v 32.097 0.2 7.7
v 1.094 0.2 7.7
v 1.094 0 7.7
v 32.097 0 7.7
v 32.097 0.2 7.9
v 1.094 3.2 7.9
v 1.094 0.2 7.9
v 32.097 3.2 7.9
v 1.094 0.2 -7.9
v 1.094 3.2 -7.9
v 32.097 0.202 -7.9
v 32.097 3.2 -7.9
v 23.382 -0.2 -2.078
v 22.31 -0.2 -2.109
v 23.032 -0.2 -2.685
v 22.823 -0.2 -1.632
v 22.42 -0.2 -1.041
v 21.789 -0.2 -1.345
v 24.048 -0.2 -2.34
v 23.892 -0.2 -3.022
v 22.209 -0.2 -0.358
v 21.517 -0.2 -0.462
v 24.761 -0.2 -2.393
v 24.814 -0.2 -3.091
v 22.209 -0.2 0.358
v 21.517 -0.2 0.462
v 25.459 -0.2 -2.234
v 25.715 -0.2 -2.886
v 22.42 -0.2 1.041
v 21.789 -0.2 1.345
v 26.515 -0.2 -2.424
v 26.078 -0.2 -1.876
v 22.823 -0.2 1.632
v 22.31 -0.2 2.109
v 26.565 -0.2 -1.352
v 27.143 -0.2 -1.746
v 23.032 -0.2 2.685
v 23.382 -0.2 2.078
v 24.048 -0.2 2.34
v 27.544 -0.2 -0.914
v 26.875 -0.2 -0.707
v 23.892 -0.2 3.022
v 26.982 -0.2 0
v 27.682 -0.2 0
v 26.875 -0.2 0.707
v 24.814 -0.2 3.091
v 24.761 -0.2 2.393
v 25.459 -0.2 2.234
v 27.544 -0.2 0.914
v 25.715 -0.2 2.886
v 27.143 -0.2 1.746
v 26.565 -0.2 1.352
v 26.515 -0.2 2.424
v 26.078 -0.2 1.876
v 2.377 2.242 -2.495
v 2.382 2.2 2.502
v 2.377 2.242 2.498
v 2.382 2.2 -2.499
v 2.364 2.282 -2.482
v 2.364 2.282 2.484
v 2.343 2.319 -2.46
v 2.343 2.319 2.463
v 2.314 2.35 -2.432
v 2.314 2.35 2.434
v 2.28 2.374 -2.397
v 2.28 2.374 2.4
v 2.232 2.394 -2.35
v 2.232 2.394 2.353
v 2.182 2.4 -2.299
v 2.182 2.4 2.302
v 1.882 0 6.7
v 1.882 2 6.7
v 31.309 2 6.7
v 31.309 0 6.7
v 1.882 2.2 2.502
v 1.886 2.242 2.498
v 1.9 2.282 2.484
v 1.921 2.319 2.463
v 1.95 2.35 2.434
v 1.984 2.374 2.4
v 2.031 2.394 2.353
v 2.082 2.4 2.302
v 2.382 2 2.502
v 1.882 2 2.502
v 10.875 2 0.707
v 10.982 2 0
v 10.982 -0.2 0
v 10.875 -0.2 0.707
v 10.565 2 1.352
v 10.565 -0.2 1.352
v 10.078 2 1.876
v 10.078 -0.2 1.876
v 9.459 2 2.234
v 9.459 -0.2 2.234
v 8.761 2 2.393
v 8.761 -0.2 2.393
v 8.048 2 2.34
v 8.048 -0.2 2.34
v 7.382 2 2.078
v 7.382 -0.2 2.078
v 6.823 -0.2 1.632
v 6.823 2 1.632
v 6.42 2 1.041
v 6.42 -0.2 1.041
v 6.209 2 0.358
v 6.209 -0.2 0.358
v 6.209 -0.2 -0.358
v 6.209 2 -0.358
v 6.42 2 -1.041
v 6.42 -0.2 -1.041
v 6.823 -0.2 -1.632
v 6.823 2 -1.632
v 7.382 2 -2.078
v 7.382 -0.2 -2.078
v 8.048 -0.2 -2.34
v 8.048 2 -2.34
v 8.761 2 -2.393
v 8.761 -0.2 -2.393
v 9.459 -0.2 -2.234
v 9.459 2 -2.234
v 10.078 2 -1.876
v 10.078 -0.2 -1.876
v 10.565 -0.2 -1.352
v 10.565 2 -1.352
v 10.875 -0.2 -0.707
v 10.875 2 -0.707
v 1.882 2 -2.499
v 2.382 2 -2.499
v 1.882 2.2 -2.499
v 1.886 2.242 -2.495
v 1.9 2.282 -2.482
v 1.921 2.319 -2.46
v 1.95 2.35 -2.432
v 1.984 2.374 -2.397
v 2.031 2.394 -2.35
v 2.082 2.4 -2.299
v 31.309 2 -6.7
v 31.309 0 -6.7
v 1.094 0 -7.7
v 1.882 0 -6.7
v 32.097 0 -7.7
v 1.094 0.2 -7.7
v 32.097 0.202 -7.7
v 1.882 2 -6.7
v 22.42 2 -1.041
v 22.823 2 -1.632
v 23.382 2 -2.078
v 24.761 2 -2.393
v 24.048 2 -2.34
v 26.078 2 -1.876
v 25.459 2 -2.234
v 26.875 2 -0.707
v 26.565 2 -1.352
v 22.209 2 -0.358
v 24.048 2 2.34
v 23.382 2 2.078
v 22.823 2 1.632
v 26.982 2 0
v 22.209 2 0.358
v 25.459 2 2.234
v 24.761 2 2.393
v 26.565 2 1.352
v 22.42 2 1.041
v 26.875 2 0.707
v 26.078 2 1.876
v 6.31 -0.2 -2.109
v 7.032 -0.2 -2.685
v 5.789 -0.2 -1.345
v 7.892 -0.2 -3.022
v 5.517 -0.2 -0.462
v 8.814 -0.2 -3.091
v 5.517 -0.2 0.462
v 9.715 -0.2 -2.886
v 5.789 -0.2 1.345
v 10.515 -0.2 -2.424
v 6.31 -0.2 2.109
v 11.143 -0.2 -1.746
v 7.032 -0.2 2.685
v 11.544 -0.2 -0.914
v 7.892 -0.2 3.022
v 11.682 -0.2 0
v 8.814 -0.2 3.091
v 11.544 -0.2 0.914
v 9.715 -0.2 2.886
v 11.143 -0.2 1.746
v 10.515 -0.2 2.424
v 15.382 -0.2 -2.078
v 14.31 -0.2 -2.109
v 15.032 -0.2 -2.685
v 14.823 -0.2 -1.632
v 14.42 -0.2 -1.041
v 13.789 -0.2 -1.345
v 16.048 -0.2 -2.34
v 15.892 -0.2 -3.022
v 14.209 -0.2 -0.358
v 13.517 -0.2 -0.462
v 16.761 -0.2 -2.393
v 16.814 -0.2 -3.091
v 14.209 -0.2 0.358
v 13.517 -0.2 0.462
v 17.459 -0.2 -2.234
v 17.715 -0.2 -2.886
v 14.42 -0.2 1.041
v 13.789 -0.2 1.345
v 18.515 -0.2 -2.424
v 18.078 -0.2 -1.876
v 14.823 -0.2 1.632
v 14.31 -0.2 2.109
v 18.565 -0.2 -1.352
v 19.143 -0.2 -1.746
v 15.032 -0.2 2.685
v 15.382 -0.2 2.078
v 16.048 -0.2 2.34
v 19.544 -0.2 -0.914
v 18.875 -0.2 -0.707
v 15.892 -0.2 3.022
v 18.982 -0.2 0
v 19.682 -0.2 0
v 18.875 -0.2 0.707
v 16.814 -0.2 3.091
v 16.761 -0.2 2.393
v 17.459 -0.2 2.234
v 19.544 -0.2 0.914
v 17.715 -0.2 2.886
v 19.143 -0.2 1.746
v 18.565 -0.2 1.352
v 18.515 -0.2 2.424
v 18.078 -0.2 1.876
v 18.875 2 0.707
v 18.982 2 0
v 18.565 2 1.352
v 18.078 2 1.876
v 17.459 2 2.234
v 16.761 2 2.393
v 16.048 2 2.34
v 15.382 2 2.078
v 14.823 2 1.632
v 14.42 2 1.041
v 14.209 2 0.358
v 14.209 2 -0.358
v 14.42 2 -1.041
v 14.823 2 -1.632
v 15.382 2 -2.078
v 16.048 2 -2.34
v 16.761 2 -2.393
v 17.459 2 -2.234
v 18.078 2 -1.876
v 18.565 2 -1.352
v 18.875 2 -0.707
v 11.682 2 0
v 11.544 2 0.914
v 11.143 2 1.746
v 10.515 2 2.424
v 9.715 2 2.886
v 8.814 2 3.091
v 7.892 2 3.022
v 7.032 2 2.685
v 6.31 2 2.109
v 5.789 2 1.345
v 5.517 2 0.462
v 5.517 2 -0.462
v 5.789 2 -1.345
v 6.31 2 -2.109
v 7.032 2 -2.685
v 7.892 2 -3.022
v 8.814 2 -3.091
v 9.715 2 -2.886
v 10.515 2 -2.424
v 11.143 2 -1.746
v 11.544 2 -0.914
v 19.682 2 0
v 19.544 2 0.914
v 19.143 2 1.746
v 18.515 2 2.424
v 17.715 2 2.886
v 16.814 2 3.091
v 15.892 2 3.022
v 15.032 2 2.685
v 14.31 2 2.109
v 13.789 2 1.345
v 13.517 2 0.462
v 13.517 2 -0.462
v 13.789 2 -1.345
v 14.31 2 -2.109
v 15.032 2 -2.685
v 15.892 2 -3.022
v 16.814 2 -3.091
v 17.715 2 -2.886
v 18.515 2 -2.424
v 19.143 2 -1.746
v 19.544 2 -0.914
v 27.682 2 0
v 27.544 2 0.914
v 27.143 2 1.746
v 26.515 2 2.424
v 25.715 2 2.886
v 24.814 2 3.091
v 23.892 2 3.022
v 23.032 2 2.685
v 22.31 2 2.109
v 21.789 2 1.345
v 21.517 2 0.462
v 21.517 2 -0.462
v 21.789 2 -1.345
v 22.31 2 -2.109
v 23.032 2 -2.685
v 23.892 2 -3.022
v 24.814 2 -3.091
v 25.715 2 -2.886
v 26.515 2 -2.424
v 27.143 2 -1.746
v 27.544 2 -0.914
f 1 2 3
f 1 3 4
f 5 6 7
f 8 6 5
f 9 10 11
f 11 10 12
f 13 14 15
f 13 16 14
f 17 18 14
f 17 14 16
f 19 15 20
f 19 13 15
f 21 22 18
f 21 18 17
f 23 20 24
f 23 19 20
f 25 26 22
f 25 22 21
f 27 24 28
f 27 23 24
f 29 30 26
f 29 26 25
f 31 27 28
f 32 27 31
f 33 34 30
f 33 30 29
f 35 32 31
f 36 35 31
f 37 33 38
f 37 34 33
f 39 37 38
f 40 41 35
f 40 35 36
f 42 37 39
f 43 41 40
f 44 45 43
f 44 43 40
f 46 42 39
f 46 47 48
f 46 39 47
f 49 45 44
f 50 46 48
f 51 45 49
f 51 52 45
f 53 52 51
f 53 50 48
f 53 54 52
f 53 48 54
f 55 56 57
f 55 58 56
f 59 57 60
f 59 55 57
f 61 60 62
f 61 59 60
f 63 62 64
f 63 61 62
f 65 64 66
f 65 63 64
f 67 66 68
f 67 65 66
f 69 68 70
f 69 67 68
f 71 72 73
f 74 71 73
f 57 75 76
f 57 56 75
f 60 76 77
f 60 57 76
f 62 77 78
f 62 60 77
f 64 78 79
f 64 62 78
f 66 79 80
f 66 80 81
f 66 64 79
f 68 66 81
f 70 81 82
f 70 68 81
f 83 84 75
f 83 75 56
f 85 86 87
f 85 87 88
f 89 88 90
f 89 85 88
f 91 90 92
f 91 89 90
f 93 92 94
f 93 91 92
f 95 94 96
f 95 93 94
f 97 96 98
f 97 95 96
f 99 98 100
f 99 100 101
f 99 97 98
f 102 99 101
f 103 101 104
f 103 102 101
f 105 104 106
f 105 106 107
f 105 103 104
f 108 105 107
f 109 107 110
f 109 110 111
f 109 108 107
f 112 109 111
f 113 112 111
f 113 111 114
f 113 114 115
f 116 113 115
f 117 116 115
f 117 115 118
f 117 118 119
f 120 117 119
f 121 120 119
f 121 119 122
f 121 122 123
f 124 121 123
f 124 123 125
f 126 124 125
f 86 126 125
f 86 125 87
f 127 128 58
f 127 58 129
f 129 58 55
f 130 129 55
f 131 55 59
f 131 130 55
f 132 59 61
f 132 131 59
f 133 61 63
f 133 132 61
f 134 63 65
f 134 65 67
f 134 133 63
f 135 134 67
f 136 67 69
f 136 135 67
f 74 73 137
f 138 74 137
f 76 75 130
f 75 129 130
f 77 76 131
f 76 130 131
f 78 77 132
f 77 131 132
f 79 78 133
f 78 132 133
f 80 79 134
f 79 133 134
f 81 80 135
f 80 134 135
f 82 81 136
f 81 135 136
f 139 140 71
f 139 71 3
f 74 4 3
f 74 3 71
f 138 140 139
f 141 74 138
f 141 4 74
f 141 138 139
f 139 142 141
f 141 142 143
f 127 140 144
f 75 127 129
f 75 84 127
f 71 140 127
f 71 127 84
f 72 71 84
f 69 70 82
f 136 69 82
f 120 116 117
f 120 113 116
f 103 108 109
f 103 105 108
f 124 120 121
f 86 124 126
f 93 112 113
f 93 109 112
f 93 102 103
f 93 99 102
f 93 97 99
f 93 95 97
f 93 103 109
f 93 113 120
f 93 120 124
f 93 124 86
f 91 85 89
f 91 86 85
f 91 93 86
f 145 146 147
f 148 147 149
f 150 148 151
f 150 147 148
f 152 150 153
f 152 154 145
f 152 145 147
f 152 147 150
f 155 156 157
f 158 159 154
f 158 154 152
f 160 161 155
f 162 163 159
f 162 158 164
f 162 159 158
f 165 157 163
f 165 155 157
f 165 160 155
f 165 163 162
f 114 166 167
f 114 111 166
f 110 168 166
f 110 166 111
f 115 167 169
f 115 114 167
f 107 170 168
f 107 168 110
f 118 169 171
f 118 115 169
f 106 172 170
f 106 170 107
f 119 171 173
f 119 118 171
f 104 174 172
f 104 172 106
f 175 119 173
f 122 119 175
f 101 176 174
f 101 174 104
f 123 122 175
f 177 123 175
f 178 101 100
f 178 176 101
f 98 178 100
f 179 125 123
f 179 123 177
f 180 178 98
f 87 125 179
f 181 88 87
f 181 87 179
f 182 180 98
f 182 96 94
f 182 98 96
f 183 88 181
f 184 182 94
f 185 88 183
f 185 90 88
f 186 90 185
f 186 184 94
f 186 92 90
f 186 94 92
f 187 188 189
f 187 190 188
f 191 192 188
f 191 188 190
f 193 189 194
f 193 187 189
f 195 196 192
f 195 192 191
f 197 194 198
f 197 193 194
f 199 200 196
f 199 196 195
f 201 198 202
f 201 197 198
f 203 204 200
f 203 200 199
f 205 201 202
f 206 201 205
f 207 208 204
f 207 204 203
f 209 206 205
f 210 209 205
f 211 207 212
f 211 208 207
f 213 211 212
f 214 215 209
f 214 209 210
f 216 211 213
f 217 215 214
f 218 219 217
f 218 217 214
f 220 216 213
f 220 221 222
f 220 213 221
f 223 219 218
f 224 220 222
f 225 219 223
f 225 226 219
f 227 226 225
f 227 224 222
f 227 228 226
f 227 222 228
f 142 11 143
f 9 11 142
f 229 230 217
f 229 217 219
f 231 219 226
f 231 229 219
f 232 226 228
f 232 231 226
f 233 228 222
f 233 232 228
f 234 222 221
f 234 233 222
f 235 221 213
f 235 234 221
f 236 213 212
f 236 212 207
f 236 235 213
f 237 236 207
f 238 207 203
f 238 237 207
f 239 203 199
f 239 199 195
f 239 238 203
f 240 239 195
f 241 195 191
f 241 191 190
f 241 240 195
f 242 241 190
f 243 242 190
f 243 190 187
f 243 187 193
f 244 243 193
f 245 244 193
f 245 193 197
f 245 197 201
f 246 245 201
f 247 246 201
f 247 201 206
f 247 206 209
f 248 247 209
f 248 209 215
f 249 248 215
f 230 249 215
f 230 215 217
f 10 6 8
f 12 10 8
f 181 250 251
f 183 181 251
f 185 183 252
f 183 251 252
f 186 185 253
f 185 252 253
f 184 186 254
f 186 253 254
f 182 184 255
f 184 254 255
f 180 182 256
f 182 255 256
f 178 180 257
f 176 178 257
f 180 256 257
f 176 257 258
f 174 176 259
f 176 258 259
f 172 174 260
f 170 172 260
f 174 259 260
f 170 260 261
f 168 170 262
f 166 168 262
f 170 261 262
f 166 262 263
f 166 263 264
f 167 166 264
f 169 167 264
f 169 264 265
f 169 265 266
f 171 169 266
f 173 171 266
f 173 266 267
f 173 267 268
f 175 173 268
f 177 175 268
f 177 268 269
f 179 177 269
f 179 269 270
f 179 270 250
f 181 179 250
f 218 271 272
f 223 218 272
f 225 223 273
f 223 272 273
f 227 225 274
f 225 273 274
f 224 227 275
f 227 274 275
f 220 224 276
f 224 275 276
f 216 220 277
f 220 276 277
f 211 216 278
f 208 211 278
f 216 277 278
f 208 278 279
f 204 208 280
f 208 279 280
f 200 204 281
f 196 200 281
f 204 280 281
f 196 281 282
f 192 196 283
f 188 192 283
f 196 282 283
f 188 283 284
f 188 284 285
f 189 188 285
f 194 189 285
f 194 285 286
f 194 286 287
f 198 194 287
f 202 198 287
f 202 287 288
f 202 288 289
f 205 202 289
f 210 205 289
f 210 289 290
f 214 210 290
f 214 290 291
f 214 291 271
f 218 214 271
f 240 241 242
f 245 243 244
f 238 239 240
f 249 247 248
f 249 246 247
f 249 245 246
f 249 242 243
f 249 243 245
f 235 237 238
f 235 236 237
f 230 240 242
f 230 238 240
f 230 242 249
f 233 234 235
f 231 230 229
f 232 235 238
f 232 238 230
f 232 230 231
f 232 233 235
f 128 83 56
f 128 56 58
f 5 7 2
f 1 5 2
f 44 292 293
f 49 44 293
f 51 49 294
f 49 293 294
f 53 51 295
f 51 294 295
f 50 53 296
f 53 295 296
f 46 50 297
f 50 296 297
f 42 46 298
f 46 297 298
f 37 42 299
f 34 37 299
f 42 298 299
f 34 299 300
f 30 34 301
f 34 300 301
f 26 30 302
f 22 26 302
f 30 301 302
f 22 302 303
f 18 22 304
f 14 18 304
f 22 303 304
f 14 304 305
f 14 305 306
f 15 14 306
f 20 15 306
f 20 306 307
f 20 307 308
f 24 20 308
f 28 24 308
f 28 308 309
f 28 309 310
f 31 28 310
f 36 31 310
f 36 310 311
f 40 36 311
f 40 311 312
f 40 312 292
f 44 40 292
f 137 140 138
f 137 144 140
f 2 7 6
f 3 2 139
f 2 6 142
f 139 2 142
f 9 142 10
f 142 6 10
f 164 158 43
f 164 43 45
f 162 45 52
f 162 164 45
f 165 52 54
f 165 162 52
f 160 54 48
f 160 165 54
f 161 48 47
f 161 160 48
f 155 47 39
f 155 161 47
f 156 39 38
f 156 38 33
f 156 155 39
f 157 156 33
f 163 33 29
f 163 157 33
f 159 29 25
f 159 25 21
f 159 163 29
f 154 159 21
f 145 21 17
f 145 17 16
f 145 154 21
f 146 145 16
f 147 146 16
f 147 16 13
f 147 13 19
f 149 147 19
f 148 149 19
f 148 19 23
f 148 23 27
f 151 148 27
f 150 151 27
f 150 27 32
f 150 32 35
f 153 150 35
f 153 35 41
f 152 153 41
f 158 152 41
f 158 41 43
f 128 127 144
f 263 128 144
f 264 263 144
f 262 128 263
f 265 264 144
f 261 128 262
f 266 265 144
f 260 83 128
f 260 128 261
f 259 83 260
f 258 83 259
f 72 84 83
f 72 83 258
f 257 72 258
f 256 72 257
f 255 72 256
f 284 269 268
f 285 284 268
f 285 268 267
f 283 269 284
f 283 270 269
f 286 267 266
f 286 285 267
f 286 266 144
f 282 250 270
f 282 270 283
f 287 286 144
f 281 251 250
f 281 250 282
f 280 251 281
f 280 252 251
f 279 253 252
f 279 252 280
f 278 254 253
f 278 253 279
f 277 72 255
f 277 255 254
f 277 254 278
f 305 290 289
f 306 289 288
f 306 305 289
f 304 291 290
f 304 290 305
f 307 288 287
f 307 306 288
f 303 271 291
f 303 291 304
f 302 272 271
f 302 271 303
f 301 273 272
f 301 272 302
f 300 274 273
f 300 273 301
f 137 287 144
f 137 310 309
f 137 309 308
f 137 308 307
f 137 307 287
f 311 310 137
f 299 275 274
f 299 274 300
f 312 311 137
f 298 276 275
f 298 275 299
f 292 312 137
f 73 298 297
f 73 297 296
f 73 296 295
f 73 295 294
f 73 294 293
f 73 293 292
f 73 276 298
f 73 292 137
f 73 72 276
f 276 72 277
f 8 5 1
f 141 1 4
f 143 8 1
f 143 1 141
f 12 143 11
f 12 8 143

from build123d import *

# Parameters (mm, degrees)
MAINBASESKETCH_W              = 47.8
MAINBASESKETCH_H              = 3.2
MAINBASEEXTRUDE_DEPTH         = 7.9
MAINBASESHELL_T               = -1.2
UNDERSIDECIRCLEEXT_START      = -0.2
UNDERSIDECIRCLESKETCH_R       = 3.1
UNDERSIDECIRCLESKETCH_R_2     = 2.4
UNDERSIDECIRCLEEXT_DEPTH      = 2.4
UNDERSIDECIRCLEPATTERN_COUNT  = 3
UNDERSIDECIRCLEPATTERN_PITCH  = 8
EXTENDEDBASEEDGECUT_DEPTH     = 0.2
EXTENDEDBASEEDGECUT2_DEPTH    = 0.2
EXTENDEDBASEEDGECUT3_DEPTH    = 0.2
EXTENDEDBASEEDGESKETCH4_W     = 47.4
EXTENDEDBASEEDGESKETCH4_H     = 0.199766916
EXTENDEDBASEEDGECUT4_DEPTH    = 0.2
EXTENDEDNBASEUNDERNOTCH_DEPTH = 0.4
EXTENDEBASENOTCHFILLET_R      = 0.2
CUT_EXTRUDE60_DEPTH           = 50.170632952
CUT_EXTRUDE60_DEPTH_BACK      = 50.170632952
SKETCH178_W                   = 15.972643613
SKETCH178_H                   = 15.8
SKETCH179_W                   = 1.2
SKETCH179_H                   = 13.4
SKETCH180_W                   = 0.411945133
SKETCH180_H                   = 15.8
CUT_EXTRUDE61_DEPTH           = 34.627758191


with BuildPart() as part:
    # MainBaseSketch → MainBaseExtrude (new, symmetric)
    with BuildSketch(Plane.XY):
        with Locations((24.581967213, 1.6)):
            Rectangle(MAINBASESKETCH_W, MAINBASESKETCH_H)
    extrude(amount=MAINBASEEXTRUDE_DEPTH, both=True)

    # MainBaseShell
    mainbaseshell_openings = [part.faces().sort_by_distance(p)[0] for p in [
        (24.581967213, 0, 0),
    ]]
    offset(amount=MAINBASESHELL_T, openings=mainbaseshell_openings, kind=Kind.INTERSECTION)

    # UnderSideCircleSketch → UnderSideCircleExt (add)
    with BuildSketch(Plane.XZ.offset(-2).offset(UNDERSIDECIRCLEEXT_START)):
        with Locations((8.581967213, 0)):
            Circle(UNDERSIDECIRCLESKETCH_R)
        with Locations((8.581967213, 0)):
            Circle(UNDERSIDECIRCLESKETCH_R_2, mode=Mode.SUBTRACT)
    undersidecircleext = extrude(amount=UNDERSIDECIRCLEEXT_DEPTH)

    # UnderSideCirclePattern: UnderSideCircleExt ×3
    with Locations(*[(i * UNDERSIDECIRCLEPATTERN_PITCH, 0, 0) for i in range(1, UNDERSIDECIRCLEPATTERN_COUNT)]):
        add(undersidecircleext)

    # ExtendedBaseEdgeSketch → ExtendedBaseEdgeCut (cut)
    with BuildSketch(Plane.ZY.offset(-0.681967213)):
        Polygon((-7.9, 0), (-7.9, 0.199766916), (-7.702184024, 0.199766916), (7.702184024, 0.199766916), (7.9, 0.199766916), (7.9, 0), (7.702184024, 0), (-7.702184024, 0), align=None)
    extrude(amount=-EXTENDEDBASEEDGECUT_DEPTH, mode=Mode.SUBTRACT)

    # ExtendedBaseEdgeSketch2 → ExtendedBaseEdgeCut2 (cut)
    with BuildSketch(Plane(origin=(0, 0, -7.9), x_dir=(-1, 0, 0), z_dir=(0, 0, -1))):
        Polygon((-48.481967213, 0), (-48.481967213, 0.203418418), (-0.881967213, 0.199766916), (-0.881967213, 0), align=None)
    extrude(amount=-EXTENDEDBASEEDGECUT2_DEPTH, mode=Mode.SUBTRACT)

    # ExtendedBaseEdgeSketch3 → ExtendedBaseEdgeCut3 (cut)
    with BuildSketch(Plane(origin=(48.481967213, 0, 0), x_dir=(0, 0, -1), z_dir=(1, 0, 0))):
        Polygon((-7.9, 0), (-7.9, 0.199766916), (7.7, 0.203418418), (7.7, 0), align=None)
    extrude(amount=-EXTENDEDBASEEDGECUT3_DEPTH, mode=Mode.SUBTRACT)

    # ExtendedBaseEdgeSketch4 → ExtendedBaseEdgeCut4 (cut)
    with BuildSketch(Plane.XY.offset(7.9)):
        with Locations((24.581967213, 0.099883458)):
            Rectangle(EXTENDEDBASEEDGESKETCH4_W, EXTENDEDBASEEDGESKETCH4_H)
    extrude(amount=-EXTENDEDBASEEDGECUT4_DEPTH, mode=Mode.SUBTRACT)

    # ExtendedbaseUnderNotchSketch → ExtendednbaseUnderNotch (cut)
    with BuildSketch(Plane.XZ.offset(-2)):
        Polygon((1.881967213, 0), (1.881967213, 2.502100162), (2.381942481, 2.502100162), (2.381942481, -2.499482153), (1.881967213, -2.499482153), align=None)
    extrude(amount=-EXTENDEDNBASEUNDERNOTCH_DEPTH, mode=Mode.SUBTRACT)

    # ExtendebaseNotchFillet
    extendebasenotchfillet_edges = [part.edges().sort_by_distance(p)[0] for p in [
        (1.881967213, 2.4, 0.001309004),
        (2.131954847, 2.4, 2.502100162),
        (2.381942481, 2.4, 0.001309004),
        (2.131954847, 2.4, -2.499482153),
    ]]
    fillet(extendebasenotchfillet_edges, radius=EXTENDEBASENOTCHFILLET_R)

    # Sketch178 → Cut-Extrude60 (cut, two sides: drawn at the far end of the back side and taken through both)
    with BuildSketch(Plane(origin=(0, 2, 0), x_dir=(-1, 0, 0), z_dir=(0, -1, 0)).offset(-CUT_EXTRUDE60_DEPTH_BACK)):
        with Locations((-40.495645407, 0)):
            Rectangle(SKETCH178_W, SKETCH178_H)
    extrude(amount=CUT_EXTRUDE60_DEPTH + CUT_EXTRUDE60_DEPTH_BACK, mode=Mode.SUBTRACT)

    # Sweep29: sweep along a curve in space
    with BuildLine() as sweep29_path:
        Line((32.5093236, 0, 6.7), (32.5093236, 2, 6.7))
    # Sketch179 → Sweep29 (sweep)
    with BuildSketch(Plane.XZ):
        with Locations((31.9093236, 0)):
            Rectangle(SKETCH179_W, SKETCH179_H)
    sweep(path=sweep29_path.line)

    # Sketch180 → Cut-Extrude61 (cut, through all)
    with BuildSketch(Plane(origin=(0, 3.2, 0), x_dir=(1, 0, 0), z_dir=(0, 1, 0))):
        with Locations((0.88793978, 0)):
            Rectangle(SKETCH180_W, SKETCH180_H)
        with Locations((32.303351034, 0)):
            Rectangle(SKETCH180_W, SKETCH180_H)
    extrude(amount=-CUT_EXTRUDE61_DEPTH, mode=Mode.SUBTRACT)


solid = part.part
